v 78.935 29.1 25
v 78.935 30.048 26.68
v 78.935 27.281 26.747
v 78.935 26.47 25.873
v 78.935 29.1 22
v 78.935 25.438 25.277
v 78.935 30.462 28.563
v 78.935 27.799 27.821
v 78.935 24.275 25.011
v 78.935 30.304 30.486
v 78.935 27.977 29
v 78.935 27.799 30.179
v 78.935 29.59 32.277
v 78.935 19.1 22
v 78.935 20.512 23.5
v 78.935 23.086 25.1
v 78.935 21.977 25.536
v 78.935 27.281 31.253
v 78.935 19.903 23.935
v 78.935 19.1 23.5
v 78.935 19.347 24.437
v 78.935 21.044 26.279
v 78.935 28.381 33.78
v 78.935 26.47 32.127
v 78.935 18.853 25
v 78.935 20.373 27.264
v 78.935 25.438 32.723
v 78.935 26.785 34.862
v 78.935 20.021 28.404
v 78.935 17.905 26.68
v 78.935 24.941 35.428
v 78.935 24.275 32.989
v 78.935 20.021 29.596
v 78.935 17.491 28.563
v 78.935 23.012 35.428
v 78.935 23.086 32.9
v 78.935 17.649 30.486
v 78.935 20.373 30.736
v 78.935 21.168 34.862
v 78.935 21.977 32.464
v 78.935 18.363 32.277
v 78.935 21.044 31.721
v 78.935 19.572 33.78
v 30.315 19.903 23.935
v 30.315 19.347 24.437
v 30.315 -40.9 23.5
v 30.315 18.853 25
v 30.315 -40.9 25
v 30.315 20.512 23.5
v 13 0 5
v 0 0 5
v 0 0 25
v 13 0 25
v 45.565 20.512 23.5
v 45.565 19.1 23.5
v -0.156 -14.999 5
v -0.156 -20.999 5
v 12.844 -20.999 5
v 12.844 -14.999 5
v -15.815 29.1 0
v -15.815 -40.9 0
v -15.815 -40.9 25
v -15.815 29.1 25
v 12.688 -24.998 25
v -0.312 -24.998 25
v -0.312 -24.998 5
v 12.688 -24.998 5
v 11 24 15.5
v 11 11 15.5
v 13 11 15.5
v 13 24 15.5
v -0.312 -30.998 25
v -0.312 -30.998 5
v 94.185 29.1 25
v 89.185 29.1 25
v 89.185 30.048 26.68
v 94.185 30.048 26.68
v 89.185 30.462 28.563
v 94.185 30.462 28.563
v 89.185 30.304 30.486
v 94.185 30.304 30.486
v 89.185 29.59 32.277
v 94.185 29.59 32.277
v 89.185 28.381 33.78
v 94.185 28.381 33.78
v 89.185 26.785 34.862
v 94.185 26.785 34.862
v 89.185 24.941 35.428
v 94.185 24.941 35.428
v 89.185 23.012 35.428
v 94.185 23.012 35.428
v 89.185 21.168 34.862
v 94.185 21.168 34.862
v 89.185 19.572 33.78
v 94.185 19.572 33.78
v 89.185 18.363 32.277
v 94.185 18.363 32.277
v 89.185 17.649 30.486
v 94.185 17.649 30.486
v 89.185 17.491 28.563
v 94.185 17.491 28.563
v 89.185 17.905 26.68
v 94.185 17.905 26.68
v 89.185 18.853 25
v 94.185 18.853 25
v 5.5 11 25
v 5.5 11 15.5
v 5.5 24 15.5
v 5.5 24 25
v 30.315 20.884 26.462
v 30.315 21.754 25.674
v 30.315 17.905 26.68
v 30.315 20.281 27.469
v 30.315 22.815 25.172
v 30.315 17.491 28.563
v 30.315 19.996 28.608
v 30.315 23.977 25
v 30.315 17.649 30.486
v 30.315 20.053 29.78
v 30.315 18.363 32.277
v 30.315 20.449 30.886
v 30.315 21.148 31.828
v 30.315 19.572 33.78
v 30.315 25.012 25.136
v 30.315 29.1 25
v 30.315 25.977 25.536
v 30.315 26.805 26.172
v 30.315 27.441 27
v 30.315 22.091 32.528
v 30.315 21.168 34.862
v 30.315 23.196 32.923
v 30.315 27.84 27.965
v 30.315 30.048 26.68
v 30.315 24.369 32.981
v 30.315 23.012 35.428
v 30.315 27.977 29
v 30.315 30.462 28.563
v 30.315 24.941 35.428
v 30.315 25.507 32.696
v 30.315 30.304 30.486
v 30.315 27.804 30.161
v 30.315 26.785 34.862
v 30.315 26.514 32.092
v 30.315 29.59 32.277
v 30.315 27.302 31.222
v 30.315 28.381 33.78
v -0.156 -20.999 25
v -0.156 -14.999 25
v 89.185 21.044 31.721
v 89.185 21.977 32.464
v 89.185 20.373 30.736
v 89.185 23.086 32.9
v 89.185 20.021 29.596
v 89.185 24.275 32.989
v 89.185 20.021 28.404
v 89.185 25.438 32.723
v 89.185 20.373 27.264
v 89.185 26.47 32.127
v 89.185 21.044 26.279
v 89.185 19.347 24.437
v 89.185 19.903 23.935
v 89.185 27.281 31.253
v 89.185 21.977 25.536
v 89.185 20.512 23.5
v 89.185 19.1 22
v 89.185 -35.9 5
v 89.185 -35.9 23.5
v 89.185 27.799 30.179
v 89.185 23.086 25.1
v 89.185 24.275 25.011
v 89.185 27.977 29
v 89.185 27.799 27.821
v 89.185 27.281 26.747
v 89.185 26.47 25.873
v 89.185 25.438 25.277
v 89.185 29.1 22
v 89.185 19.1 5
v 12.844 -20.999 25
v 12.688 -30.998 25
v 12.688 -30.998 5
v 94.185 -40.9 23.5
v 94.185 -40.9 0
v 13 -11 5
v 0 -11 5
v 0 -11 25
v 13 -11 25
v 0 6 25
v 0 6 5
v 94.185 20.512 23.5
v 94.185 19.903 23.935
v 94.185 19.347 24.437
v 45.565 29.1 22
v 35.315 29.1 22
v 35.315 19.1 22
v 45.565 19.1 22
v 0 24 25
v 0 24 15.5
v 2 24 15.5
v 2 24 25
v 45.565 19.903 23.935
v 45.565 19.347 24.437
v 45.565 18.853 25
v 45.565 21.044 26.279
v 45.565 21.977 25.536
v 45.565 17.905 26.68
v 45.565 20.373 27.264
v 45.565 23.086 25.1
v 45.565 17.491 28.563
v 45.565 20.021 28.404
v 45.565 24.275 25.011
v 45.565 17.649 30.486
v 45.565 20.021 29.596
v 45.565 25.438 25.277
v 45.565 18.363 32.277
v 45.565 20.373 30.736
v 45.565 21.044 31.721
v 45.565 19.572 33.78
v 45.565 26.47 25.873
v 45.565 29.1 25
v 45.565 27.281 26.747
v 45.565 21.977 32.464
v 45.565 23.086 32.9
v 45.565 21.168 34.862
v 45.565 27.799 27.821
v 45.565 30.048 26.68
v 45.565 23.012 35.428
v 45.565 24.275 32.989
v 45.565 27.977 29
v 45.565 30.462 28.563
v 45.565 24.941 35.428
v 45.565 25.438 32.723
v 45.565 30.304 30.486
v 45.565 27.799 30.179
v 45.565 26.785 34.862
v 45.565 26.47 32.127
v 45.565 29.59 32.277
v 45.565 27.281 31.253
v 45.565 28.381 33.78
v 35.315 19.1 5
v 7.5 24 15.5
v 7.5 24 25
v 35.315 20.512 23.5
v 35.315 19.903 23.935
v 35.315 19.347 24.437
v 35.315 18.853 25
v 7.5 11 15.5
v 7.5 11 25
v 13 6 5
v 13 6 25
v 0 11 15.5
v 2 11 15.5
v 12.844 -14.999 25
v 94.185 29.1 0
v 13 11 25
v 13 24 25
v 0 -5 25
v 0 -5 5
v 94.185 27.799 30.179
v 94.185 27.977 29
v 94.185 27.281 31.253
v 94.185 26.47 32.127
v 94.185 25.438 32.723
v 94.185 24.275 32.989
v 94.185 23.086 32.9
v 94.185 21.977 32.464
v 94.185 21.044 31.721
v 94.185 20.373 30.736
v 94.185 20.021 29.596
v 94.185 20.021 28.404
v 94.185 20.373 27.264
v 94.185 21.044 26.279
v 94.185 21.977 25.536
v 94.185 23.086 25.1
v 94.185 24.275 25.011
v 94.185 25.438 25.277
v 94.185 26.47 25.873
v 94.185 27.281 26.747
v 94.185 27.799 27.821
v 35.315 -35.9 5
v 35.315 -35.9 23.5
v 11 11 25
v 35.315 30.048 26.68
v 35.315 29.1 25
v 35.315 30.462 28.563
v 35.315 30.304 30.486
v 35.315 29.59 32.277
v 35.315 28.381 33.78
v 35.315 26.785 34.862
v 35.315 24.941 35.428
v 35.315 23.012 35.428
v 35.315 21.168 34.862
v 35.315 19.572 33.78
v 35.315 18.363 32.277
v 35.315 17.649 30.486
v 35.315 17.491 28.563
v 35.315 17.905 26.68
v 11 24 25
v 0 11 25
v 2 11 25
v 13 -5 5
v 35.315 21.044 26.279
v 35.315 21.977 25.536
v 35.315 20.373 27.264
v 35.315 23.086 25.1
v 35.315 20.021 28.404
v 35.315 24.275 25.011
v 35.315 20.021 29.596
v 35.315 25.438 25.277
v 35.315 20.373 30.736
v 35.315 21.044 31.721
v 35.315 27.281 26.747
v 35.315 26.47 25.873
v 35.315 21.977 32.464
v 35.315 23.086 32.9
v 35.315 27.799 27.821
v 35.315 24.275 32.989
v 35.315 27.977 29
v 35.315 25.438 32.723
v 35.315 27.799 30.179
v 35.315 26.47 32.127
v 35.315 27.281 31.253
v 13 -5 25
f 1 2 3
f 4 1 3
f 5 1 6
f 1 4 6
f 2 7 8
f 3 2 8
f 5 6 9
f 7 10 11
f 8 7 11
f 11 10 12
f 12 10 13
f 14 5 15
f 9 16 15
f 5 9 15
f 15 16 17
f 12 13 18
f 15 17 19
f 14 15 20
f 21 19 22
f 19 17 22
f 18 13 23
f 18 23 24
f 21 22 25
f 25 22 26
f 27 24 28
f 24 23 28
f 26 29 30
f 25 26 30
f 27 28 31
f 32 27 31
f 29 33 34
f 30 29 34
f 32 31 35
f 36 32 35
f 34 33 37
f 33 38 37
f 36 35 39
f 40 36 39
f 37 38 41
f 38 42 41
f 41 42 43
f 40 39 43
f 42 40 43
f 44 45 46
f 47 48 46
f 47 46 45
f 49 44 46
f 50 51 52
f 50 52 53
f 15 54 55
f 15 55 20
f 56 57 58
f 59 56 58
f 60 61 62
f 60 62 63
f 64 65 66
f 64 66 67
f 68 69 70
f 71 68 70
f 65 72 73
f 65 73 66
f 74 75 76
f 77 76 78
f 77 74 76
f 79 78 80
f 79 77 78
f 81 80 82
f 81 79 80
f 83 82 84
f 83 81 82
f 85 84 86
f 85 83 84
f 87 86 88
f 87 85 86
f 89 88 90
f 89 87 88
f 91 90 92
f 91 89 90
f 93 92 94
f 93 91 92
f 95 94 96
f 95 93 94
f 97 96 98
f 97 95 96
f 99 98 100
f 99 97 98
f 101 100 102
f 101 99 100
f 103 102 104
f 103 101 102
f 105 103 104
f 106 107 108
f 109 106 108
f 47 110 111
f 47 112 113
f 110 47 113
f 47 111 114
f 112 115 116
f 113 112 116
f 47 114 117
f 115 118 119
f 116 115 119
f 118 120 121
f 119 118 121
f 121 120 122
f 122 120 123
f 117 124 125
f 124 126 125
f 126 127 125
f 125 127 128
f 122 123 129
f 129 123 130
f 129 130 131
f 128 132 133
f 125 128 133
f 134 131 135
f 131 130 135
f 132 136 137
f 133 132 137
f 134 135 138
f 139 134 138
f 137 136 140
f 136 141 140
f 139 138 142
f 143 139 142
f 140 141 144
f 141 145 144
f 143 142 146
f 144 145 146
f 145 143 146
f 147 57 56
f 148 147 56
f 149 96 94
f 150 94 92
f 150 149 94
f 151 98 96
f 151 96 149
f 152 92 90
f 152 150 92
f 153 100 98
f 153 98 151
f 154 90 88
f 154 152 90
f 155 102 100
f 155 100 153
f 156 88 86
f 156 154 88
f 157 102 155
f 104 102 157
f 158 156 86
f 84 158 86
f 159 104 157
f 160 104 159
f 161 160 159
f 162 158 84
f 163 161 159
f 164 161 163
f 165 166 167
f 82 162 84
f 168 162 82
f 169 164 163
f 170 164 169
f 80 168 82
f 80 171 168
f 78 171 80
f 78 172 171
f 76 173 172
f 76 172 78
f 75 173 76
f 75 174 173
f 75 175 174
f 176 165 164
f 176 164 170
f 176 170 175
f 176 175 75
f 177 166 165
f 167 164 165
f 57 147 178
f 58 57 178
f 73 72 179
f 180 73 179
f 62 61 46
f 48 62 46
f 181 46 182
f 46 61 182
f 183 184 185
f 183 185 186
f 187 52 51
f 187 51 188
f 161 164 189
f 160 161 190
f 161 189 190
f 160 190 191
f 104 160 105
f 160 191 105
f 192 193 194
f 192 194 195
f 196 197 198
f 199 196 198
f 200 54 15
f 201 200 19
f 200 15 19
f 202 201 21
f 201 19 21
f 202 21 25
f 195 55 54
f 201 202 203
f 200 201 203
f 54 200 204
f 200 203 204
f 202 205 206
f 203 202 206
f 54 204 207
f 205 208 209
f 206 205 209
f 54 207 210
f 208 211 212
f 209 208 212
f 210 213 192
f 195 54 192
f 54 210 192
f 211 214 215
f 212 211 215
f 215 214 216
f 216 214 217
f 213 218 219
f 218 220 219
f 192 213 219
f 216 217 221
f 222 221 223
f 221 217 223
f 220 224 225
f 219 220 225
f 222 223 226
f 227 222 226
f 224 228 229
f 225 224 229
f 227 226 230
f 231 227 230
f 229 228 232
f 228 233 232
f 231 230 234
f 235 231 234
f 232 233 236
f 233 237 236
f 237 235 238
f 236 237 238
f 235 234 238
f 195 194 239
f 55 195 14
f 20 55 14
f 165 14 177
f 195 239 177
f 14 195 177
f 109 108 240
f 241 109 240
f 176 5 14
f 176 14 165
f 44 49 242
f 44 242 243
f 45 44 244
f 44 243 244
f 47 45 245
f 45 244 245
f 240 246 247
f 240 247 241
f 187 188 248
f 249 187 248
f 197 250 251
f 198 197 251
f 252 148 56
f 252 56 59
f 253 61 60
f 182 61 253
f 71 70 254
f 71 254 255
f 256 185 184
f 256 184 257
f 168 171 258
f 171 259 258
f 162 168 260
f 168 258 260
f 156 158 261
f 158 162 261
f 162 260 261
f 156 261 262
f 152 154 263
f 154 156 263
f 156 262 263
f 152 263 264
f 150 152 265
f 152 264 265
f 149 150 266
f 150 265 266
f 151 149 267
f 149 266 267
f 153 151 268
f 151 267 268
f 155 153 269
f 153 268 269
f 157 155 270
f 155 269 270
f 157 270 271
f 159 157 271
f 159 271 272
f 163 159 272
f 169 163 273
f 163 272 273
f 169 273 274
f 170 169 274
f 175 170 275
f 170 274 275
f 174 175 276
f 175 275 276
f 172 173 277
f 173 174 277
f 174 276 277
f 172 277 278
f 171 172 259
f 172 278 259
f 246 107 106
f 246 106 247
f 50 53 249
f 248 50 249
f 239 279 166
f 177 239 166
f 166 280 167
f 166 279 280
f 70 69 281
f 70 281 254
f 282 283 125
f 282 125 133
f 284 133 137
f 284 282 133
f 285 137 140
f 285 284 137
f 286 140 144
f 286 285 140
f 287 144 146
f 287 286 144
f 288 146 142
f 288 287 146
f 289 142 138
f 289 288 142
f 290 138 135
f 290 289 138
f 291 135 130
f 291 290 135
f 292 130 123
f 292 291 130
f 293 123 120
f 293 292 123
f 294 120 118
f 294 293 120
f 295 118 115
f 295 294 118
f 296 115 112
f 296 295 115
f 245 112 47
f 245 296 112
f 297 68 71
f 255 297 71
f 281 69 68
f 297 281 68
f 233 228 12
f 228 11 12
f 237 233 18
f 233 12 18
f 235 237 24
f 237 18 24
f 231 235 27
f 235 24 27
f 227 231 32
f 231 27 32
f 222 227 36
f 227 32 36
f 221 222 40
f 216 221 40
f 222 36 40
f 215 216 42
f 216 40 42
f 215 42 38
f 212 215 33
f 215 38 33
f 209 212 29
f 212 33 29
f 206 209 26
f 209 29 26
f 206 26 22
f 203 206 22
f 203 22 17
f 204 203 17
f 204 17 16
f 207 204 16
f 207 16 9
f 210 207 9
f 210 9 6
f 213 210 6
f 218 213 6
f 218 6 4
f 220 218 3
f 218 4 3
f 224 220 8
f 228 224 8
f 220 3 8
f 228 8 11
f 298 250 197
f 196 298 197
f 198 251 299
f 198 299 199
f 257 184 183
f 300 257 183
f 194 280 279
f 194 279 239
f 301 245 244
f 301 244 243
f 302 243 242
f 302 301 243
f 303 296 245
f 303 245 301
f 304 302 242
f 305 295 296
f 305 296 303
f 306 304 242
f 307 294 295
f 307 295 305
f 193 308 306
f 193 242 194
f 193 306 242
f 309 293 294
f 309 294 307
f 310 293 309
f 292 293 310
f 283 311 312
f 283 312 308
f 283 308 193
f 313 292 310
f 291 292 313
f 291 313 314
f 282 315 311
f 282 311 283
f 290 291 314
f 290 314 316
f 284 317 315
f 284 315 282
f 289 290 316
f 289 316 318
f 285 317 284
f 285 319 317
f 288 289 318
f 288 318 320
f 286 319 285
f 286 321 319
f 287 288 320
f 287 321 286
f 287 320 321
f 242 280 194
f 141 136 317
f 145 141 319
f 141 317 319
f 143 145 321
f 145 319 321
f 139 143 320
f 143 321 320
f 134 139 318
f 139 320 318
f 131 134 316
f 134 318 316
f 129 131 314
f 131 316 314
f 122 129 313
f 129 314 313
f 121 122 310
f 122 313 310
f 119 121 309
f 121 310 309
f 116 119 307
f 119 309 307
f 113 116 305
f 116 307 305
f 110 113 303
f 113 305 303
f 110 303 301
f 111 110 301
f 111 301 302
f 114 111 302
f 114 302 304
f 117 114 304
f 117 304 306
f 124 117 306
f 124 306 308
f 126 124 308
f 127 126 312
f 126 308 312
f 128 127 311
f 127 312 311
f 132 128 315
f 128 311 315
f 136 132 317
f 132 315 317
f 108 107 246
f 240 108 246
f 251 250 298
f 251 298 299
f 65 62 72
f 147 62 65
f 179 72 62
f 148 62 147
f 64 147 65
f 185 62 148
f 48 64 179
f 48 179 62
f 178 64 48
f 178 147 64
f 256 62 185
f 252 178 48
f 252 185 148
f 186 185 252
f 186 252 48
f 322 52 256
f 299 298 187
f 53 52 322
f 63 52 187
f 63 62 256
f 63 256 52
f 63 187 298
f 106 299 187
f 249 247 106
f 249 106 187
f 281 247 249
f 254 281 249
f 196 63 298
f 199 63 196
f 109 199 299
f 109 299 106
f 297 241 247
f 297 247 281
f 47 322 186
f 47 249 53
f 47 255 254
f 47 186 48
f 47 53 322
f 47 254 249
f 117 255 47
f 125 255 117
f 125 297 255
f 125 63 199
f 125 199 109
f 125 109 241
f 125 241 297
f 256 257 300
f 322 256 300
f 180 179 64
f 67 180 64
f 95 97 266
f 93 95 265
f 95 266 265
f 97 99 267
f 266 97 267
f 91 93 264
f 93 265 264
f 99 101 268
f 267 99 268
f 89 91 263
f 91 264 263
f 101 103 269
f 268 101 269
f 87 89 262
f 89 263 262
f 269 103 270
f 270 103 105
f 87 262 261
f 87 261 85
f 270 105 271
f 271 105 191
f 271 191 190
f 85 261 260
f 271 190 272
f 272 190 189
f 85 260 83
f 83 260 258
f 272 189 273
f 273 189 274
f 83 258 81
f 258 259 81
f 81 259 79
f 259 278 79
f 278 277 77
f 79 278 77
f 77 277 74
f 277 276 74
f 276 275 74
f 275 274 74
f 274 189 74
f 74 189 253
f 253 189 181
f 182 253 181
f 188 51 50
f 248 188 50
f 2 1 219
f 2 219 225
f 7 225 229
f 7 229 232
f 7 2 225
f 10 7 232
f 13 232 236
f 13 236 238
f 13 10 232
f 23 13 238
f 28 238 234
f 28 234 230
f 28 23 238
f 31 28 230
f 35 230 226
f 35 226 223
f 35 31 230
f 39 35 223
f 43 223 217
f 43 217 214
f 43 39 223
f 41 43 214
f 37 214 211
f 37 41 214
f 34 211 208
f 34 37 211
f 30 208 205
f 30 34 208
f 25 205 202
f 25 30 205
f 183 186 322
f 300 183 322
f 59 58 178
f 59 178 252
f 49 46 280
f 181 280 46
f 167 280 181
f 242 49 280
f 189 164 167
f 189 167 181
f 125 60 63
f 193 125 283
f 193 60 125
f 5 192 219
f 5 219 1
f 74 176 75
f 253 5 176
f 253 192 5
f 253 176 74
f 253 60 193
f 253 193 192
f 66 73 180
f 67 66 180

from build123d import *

# Parameters (mm, degrees)
F0_W      = 110
F0_H      = 70
F0_W_2    = 13
F0_H_2    = 6
F0_W_3    = 53.87
F0_H_3    = 55
F0_W_4    = 2
F0_H_4    = 13
F1_DEPTH  = 25
F2_W      = 53.87
F2_H      = 55
F2_W_2    = 13
F2_H_2    = 6
F3_DEPTH  = 5
F4_W      = 2
F4_H      = 13
F5_DEPTH  = 15.5
F6_R      = 6.5
F6_R_2    = 4
F7_DEPTH  = 63.87
F8_W      = 10.25
F8_H      = 10.246950766
F8_H_2    = 5
F9_DEPTH  = 25
F11_DEPTH = 63.87
F12_W     = 63.8700000004
F12_H     = 64.876524617
F12_W_2   = 53.87
F12_H_2   = 55
F13_DEPTH = 1
F14_W     = 10.25
F14_H     = 10.246950766
F15_DEPTH = 3
F16_DEPTH = 3
F17_W     = 13
F17_H     = 6
F18_DEPTH = 5


# Not quite as in the source:
# - a feature names something its author has since deleted; it is built from what else it names


with BuildPart() as f1:
    # F0 (on Top) → F1 (new body)
    with BuildSketch(Plane.XY):
        with Locations((39.185, -5.9)):
            Rectangle(F0_W, F0_H)
        with Locations((6.18753814, -27.9975590407)):
            Rectangle(F0_W_2, F0_H_2, mode=Mode.SUBTRACT)
        with Locations((6.34376907, -17.9987795203)):
            Rectangle(F0_W_2, F0_H_2, mode=Mode.SUBTRACT)
        with Locations((6.5, -8)):
            Rectangle(F0_W_2, F0_H_2, mode=Mode.SUBTRACT)
        with Locations((62.25, -8.4)):
            Rectangle(F0_W_3, F0_H_3, mode=Mode.SUBTRACT)
        with Locations((6.5, 3)):
            Rectangle(F0_W_2, F0_H_2, mode=Mode.SUBTRACT)
        with Locations((1, 17.5)):
            Rectangle(F0_W_4, F0_H_4, mode=Mode.SUBTRACT)
        with Locations((6.5, 17.5)):
            Rectangle(F0_W_4, F0_H_4, mode=Mode.SUBTRACT)
        with Locations((12, 17.5)):
            Rectangle(F0_W_4, F0_H_4, mode=Mode.SUBTRACT)
    extrude(amount=F1_DEPTH)

    # F2 (on face) → F3 (join)
    with BuildSketch(Plane(origin=(0, 0, 0), x_dir=(1, 0, 0), z_dir=(0, 0, -1))):
        with Locations((62.25, 8.4)):
            Rectangle(F2_W, F2_H)
        with Locations((6.5, -3)):
            Rectangle(F2_W_2, F2_H_2)
        with Locations((6.5, 8)):
            Rectangle(F2_W_2, F2_H_2)
    extrude(amount=-F3_DEPTH)

    # F4 (on face) → F5 (join)
    with BuildSketch(Plane(origin=(0, 0, 0), x_dir=(1, 0, 0), z_dir=(0, 0, -1))):
        with Locations((12, -17.5)):
            Rectangle(F4_W, F4_H)
        with Locations((6.5, -17.5)):
            Rectangle(F4_W, F4_H)
        with Locations((1, -17.5)):
            Rectangle(F4_W, F4_H)
    extrude(amount=-F5_DEPTH)

    # F6 (on face) → F7 (join)
    with BuildSketch(Plane.YZ.offset(94.185)):
        with Locations((23.976524617, 29)):
            Circle(F6_R)
        with Locations((23.976524617, 29)):
            Circle(F6_R_2, mode=Mode.SUBTRACT)
    extrude(amount=-F7_DEPTH)

    # F8 (on face) → F9 (cut)
    with BuildSketch(Plane.XY.offset(25)):
        with Locations((40.44, 23.976524617)):
            Rectangle(F8_W, F8_H)
        with Locations((40.44, 16.353049234)):
            Rectangle(F8_W, F8_H_2)
        with Locations((40.44, 31.6)):
            Rectangle(F8_W, F8_H_2)
        with Locations((84.06, 16.353049234)):
            Rectangle(F8_W, F8_H_2)
        with Locations((84.06, 23.976524617)):
            Rectangle(F8_W, F8_H)
        with Locations((84.06, 31.6)):
            Rectangle(F8_W, F8_H_2)
    extrude(amount=F9_DEPTH, mode=Mode.SUBTRACT)

    # F10 (on face) → F11 (cut, through all)
    with BuildSketch(Plane.YZ.offset(94.185)):
        with BuildLine():
            ThreePointArc((23.976524617, 22.5), (21.1260860543, 23.1583392772), (18.853049234, 25))
            Line((18.853049234, 25), (-40.9, 25))
            Line((-40.9, 25), (-40.9, 22.5))
            Line((-40.9, 22.5), (23.976524617, 22.5))
        make_face()
    extrude(amount=-F11_DEPTH, mode=Mode.SUBTRACT)

    # F12 (on face) → F13 (join)
    with BuildSketch(Plane.XY.offset(22.5)):
        with Locations((62.2499999998, -8.4617376915)):
            Rectangle(F12_W, F12_H)
        with Locations((62.25, -8.4)):
            Rectangle(F12_W_2, F12_H_2, mode=Mode.SUBTRACT)
    extrude(amount=F13_DEPTH)

    # F14 (on face) → F15 (cut)
    with BuildSketch(Plane.XY.offset(25)):
        with Locations((40.44, 23.976524617)):
            Rectangle(F14_W, F14_H)
    extrude(amount=-F15_DEPTH, mode=Mode.SUBTRACT)

    # F16 (cut): a face of the model
    f16_faces = [f1.faces().sort_by_distance(p)[0] for p in [
        (84.06, 23.976524617, 25),
    ]]
    extrude(f16_faces, amount=-F16_DEPTH, mode=Mode.SUBTRACT)

    # F17 (on face) → F18 (join)
    with BuildSketch(Plane(origin=(0, 0, 0), x_dir=(1, 0, 0), z_dir=(0, 0, -1))):
        with Locations((6.34376907, 17.9987795203)):
            Rectangle(F17_W, F17_H)
        with Locations((6.18753814, 27.9975590407)):
            Rectangle(F17_W, F17_H)
    extrude(amount=-F18_DEPTH)


solid = f1.part
